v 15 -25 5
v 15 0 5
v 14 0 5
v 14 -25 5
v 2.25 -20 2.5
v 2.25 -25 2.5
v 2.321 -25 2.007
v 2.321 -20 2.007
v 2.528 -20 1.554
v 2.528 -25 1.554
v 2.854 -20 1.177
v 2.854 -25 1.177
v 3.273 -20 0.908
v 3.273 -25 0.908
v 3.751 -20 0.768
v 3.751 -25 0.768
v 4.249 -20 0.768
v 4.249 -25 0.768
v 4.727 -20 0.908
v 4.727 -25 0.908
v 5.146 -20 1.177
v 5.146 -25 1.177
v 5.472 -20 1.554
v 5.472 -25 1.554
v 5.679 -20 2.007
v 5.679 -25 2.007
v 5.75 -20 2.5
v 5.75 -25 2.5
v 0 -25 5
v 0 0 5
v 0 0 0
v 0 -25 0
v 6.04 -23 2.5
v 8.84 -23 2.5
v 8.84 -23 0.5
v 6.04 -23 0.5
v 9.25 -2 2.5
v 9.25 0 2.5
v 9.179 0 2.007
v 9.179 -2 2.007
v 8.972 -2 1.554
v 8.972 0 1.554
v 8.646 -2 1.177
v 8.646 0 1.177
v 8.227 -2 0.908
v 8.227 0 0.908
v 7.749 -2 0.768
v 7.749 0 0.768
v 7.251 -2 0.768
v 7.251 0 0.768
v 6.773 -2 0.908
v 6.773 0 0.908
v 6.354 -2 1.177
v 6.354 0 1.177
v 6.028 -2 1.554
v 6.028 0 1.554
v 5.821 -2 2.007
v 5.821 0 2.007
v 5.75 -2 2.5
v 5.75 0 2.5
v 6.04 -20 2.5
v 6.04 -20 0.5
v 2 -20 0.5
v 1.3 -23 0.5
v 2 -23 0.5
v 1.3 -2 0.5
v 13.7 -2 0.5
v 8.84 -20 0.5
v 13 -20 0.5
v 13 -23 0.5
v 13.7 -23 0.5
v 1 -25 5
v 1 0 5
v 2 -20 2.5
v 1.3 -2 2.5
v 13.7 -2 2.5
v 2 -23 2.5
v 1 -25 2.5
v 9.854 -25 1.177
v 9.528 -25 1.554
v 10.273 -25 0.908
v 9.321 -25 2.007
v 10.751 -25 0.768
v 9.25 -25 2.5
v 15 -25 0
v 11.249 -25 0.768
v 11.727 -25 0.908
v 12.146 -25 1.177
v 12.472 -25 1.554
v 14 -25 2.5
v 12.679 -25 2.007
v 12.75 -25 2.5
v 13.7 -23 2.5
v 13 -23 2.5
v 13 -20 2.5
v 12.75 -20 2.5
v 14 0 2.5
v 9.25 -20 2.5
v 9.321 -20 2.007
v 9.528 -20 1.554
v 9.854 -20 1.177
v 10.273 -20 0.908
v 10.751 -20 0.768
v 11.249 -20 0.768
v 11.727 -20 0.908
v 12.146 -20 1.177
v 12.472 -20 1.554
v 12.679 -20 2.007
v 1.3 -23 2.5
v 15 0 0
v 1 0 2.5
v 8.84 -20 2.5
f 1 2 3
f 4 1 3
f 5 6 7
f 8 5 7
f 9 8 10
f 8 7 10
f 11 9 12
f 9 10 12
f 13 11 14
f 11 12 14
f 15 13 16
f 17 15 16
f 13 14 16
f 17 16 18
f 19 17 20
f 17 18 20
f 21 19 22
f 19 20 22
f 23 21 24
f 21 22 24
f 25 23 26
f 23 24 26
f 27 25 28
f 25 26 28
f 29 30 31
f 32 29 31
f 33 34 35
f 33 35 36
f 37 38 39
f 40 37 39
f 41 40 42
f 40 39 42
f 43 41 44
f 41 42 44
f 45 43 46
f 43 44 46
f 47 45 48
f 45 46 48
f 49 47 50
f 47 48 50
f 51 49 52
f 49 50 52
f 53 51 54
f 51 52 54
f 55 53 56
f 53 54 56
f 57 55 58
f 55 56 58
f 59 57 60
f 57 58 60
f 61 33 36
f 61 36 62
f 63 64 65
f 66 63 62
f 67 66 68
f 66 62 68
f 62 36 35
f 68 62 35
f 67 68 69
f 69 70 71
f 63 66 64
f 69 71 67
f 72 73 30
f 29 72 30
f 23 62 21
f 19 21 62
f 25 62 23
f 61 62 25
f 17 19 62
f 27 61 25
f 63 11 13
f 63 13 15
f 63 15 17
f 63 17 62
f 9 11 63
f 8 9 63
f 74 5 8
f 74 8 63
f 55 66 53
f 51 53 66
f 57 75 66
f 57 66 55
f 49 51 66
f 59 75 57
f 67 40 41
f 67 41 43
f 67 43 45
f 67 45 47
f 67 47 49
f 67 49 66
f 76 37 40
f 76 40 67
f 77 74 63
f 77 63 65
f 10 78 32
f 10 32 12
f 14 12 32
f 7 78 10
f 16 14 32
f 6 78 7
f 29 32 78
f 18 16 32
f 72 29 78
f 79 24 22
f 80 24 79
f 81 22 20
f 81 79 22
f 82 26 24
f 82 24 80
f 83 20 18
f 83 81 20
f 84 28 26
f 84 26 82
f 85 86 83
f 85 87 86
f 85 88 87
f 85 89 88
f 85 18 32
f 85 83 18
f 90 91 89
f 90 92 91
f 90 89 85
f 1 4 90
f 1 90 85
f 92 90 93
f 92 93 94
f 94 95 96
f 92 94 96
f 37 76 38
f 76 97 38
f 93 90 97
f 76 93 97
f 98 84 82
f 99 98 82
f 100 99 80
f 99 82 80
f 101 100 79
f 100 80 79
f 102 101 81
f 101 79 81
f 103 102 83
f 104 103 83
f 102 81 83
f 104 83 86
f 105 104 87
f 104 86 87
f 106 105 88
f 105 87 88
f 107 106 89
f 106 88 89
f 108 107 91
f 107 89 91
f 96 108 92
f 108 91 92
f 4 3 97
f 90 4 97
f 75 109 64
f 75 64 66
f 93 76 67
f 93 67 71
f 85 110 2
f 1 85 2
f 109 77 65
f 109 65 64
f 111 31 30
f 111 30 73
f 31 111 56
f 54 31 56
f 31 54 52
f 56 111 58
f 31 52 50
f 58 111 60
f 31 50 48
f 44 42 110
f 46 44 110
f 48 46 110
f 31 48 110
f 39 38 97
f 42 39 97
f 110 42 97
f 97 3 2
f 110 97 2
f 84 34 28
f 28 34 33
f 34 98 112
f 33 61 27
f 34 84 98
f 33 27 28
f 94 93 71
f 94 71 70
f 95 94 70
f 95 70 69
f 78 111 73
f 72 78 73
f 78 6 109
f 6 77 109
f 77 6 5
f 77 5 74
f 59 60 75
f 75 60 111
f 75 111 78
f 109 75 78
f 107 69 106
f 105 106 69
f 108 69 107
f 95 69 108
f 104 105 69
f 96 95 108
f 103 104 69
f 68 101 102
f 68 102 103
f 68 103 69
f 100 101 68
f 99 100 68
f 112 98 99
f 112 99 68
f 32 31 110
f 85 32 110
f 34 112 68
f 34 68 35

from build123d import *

# Parameters (mm, degrees)
PAD_DEPTH      = 25
SKETCH001_R    = 1.75
HOLE_DEPTH     = 5
HOLE_TIPS_R    = 1.75
POCKET_DEPTH   = 2
SKETCH003_R    = 1.75
HOLE001_DEPTH  = 2
HOLE001_TIPS_R = 1.75


with BuildPart() as part:
    # Sketch → Pad (new body)
    with BuildSketch(Plane.XZ):
        Polygon((0, 0), (15, 0), (15, 5), (14, 5), (14, 2.5), (1, 2.5), (1, 5), (0, 5), align=None)
    extrude(amount=PAD_DEPTH)

    # Sketch001 (on Face10 of Pad) → Hole (cut)
    with BuildSketch(Plane.XZ.offset(25)):
        with Locations((4, 2.5)):
            Circle(SKETCH001_R)
        with Locations((11, 2.5)):
            Circle(SKETCH001_R)
    extrude(amount=-HOLE_DEPTH, mode=Mode.SUBTRACT)

    # Hole tips → Hole tip 1 section 0
    with BuildSketch(Plane.XZ.offset(20), mode=Mode.PRIVATE) as hole_tip_1_s0:
        with Locations((4, 2.5)):
            Circle(HOLE_TIPS_R)
    loft([hole_tip_1_s0.sketch, Vertex(4, -18.948494, 2.5)], mode=Mode.SUBTRACT)

    # Hole tips → Hole tip 2 section 0
    with BuildSketch(Plane.XZ.offset(20), mode=Mode.PRIVATE) as hole_tip_2_s0:
        with Locations((11, 2.5)):
            Circle(HOLE_TIPS_R)
    loft([hole_tip_2_s0.sketch, Vertex(11, -18.948494, 2.5)], mode=Mode.SUBTRACT)

    # Sketch002 (on Face2 of Hole) → Pocket (cut)
    with BuildSketch(Plane(origin=(0, 0, 2.5), x_dir=(-1, 0, 0), z_dir=(0, 0, 1))):
        Polygon((-13.7, 23), (-13, 23), (-13, 20), (-8.84, 20), (-8.84, 23), (-6.04, 23), (-6.04, 20), (-2, 20), (-2, 23), (-1.3, 23), (-1.3, 2), (-13.7, 2), align=None)
    extrude(amount=-POCKET_DEPTH, mode=Mode.SUBTRACT)

    # Sketch003 (on Face4 of Pocket) → Hole001 (cut)
    with BuildSketch(Plane(origin=(0, 0, 0), x_dir=(1, 0, 0), z_dir=(0, 1, 0))):
        with Locations((7.5, -2.5)):
            Circle(SKETCH003_R)
    extrude(amount=-HOLE001_DEPTH, mode=Mode.SUBTRACT)

    # Hole001 tips → Hole001 tip 1 section 0
    with BuildSketch(Plane(origin=(0, -2, 0), x_dir=(1, 0, 0), z_dir=(0, 1, 0)), mode=Mode.PRIVATE) as hole001_tip_1_s0:
        with Locations((7.5, -2.5)):
            Circle(HOLE001_TIPS_R)
    loft([hole001_tip_1_s0.sketch, Vertex(7.5, -3.051506, 2.5)], mode=Mode.SUBTRACT)


solid = part.part
